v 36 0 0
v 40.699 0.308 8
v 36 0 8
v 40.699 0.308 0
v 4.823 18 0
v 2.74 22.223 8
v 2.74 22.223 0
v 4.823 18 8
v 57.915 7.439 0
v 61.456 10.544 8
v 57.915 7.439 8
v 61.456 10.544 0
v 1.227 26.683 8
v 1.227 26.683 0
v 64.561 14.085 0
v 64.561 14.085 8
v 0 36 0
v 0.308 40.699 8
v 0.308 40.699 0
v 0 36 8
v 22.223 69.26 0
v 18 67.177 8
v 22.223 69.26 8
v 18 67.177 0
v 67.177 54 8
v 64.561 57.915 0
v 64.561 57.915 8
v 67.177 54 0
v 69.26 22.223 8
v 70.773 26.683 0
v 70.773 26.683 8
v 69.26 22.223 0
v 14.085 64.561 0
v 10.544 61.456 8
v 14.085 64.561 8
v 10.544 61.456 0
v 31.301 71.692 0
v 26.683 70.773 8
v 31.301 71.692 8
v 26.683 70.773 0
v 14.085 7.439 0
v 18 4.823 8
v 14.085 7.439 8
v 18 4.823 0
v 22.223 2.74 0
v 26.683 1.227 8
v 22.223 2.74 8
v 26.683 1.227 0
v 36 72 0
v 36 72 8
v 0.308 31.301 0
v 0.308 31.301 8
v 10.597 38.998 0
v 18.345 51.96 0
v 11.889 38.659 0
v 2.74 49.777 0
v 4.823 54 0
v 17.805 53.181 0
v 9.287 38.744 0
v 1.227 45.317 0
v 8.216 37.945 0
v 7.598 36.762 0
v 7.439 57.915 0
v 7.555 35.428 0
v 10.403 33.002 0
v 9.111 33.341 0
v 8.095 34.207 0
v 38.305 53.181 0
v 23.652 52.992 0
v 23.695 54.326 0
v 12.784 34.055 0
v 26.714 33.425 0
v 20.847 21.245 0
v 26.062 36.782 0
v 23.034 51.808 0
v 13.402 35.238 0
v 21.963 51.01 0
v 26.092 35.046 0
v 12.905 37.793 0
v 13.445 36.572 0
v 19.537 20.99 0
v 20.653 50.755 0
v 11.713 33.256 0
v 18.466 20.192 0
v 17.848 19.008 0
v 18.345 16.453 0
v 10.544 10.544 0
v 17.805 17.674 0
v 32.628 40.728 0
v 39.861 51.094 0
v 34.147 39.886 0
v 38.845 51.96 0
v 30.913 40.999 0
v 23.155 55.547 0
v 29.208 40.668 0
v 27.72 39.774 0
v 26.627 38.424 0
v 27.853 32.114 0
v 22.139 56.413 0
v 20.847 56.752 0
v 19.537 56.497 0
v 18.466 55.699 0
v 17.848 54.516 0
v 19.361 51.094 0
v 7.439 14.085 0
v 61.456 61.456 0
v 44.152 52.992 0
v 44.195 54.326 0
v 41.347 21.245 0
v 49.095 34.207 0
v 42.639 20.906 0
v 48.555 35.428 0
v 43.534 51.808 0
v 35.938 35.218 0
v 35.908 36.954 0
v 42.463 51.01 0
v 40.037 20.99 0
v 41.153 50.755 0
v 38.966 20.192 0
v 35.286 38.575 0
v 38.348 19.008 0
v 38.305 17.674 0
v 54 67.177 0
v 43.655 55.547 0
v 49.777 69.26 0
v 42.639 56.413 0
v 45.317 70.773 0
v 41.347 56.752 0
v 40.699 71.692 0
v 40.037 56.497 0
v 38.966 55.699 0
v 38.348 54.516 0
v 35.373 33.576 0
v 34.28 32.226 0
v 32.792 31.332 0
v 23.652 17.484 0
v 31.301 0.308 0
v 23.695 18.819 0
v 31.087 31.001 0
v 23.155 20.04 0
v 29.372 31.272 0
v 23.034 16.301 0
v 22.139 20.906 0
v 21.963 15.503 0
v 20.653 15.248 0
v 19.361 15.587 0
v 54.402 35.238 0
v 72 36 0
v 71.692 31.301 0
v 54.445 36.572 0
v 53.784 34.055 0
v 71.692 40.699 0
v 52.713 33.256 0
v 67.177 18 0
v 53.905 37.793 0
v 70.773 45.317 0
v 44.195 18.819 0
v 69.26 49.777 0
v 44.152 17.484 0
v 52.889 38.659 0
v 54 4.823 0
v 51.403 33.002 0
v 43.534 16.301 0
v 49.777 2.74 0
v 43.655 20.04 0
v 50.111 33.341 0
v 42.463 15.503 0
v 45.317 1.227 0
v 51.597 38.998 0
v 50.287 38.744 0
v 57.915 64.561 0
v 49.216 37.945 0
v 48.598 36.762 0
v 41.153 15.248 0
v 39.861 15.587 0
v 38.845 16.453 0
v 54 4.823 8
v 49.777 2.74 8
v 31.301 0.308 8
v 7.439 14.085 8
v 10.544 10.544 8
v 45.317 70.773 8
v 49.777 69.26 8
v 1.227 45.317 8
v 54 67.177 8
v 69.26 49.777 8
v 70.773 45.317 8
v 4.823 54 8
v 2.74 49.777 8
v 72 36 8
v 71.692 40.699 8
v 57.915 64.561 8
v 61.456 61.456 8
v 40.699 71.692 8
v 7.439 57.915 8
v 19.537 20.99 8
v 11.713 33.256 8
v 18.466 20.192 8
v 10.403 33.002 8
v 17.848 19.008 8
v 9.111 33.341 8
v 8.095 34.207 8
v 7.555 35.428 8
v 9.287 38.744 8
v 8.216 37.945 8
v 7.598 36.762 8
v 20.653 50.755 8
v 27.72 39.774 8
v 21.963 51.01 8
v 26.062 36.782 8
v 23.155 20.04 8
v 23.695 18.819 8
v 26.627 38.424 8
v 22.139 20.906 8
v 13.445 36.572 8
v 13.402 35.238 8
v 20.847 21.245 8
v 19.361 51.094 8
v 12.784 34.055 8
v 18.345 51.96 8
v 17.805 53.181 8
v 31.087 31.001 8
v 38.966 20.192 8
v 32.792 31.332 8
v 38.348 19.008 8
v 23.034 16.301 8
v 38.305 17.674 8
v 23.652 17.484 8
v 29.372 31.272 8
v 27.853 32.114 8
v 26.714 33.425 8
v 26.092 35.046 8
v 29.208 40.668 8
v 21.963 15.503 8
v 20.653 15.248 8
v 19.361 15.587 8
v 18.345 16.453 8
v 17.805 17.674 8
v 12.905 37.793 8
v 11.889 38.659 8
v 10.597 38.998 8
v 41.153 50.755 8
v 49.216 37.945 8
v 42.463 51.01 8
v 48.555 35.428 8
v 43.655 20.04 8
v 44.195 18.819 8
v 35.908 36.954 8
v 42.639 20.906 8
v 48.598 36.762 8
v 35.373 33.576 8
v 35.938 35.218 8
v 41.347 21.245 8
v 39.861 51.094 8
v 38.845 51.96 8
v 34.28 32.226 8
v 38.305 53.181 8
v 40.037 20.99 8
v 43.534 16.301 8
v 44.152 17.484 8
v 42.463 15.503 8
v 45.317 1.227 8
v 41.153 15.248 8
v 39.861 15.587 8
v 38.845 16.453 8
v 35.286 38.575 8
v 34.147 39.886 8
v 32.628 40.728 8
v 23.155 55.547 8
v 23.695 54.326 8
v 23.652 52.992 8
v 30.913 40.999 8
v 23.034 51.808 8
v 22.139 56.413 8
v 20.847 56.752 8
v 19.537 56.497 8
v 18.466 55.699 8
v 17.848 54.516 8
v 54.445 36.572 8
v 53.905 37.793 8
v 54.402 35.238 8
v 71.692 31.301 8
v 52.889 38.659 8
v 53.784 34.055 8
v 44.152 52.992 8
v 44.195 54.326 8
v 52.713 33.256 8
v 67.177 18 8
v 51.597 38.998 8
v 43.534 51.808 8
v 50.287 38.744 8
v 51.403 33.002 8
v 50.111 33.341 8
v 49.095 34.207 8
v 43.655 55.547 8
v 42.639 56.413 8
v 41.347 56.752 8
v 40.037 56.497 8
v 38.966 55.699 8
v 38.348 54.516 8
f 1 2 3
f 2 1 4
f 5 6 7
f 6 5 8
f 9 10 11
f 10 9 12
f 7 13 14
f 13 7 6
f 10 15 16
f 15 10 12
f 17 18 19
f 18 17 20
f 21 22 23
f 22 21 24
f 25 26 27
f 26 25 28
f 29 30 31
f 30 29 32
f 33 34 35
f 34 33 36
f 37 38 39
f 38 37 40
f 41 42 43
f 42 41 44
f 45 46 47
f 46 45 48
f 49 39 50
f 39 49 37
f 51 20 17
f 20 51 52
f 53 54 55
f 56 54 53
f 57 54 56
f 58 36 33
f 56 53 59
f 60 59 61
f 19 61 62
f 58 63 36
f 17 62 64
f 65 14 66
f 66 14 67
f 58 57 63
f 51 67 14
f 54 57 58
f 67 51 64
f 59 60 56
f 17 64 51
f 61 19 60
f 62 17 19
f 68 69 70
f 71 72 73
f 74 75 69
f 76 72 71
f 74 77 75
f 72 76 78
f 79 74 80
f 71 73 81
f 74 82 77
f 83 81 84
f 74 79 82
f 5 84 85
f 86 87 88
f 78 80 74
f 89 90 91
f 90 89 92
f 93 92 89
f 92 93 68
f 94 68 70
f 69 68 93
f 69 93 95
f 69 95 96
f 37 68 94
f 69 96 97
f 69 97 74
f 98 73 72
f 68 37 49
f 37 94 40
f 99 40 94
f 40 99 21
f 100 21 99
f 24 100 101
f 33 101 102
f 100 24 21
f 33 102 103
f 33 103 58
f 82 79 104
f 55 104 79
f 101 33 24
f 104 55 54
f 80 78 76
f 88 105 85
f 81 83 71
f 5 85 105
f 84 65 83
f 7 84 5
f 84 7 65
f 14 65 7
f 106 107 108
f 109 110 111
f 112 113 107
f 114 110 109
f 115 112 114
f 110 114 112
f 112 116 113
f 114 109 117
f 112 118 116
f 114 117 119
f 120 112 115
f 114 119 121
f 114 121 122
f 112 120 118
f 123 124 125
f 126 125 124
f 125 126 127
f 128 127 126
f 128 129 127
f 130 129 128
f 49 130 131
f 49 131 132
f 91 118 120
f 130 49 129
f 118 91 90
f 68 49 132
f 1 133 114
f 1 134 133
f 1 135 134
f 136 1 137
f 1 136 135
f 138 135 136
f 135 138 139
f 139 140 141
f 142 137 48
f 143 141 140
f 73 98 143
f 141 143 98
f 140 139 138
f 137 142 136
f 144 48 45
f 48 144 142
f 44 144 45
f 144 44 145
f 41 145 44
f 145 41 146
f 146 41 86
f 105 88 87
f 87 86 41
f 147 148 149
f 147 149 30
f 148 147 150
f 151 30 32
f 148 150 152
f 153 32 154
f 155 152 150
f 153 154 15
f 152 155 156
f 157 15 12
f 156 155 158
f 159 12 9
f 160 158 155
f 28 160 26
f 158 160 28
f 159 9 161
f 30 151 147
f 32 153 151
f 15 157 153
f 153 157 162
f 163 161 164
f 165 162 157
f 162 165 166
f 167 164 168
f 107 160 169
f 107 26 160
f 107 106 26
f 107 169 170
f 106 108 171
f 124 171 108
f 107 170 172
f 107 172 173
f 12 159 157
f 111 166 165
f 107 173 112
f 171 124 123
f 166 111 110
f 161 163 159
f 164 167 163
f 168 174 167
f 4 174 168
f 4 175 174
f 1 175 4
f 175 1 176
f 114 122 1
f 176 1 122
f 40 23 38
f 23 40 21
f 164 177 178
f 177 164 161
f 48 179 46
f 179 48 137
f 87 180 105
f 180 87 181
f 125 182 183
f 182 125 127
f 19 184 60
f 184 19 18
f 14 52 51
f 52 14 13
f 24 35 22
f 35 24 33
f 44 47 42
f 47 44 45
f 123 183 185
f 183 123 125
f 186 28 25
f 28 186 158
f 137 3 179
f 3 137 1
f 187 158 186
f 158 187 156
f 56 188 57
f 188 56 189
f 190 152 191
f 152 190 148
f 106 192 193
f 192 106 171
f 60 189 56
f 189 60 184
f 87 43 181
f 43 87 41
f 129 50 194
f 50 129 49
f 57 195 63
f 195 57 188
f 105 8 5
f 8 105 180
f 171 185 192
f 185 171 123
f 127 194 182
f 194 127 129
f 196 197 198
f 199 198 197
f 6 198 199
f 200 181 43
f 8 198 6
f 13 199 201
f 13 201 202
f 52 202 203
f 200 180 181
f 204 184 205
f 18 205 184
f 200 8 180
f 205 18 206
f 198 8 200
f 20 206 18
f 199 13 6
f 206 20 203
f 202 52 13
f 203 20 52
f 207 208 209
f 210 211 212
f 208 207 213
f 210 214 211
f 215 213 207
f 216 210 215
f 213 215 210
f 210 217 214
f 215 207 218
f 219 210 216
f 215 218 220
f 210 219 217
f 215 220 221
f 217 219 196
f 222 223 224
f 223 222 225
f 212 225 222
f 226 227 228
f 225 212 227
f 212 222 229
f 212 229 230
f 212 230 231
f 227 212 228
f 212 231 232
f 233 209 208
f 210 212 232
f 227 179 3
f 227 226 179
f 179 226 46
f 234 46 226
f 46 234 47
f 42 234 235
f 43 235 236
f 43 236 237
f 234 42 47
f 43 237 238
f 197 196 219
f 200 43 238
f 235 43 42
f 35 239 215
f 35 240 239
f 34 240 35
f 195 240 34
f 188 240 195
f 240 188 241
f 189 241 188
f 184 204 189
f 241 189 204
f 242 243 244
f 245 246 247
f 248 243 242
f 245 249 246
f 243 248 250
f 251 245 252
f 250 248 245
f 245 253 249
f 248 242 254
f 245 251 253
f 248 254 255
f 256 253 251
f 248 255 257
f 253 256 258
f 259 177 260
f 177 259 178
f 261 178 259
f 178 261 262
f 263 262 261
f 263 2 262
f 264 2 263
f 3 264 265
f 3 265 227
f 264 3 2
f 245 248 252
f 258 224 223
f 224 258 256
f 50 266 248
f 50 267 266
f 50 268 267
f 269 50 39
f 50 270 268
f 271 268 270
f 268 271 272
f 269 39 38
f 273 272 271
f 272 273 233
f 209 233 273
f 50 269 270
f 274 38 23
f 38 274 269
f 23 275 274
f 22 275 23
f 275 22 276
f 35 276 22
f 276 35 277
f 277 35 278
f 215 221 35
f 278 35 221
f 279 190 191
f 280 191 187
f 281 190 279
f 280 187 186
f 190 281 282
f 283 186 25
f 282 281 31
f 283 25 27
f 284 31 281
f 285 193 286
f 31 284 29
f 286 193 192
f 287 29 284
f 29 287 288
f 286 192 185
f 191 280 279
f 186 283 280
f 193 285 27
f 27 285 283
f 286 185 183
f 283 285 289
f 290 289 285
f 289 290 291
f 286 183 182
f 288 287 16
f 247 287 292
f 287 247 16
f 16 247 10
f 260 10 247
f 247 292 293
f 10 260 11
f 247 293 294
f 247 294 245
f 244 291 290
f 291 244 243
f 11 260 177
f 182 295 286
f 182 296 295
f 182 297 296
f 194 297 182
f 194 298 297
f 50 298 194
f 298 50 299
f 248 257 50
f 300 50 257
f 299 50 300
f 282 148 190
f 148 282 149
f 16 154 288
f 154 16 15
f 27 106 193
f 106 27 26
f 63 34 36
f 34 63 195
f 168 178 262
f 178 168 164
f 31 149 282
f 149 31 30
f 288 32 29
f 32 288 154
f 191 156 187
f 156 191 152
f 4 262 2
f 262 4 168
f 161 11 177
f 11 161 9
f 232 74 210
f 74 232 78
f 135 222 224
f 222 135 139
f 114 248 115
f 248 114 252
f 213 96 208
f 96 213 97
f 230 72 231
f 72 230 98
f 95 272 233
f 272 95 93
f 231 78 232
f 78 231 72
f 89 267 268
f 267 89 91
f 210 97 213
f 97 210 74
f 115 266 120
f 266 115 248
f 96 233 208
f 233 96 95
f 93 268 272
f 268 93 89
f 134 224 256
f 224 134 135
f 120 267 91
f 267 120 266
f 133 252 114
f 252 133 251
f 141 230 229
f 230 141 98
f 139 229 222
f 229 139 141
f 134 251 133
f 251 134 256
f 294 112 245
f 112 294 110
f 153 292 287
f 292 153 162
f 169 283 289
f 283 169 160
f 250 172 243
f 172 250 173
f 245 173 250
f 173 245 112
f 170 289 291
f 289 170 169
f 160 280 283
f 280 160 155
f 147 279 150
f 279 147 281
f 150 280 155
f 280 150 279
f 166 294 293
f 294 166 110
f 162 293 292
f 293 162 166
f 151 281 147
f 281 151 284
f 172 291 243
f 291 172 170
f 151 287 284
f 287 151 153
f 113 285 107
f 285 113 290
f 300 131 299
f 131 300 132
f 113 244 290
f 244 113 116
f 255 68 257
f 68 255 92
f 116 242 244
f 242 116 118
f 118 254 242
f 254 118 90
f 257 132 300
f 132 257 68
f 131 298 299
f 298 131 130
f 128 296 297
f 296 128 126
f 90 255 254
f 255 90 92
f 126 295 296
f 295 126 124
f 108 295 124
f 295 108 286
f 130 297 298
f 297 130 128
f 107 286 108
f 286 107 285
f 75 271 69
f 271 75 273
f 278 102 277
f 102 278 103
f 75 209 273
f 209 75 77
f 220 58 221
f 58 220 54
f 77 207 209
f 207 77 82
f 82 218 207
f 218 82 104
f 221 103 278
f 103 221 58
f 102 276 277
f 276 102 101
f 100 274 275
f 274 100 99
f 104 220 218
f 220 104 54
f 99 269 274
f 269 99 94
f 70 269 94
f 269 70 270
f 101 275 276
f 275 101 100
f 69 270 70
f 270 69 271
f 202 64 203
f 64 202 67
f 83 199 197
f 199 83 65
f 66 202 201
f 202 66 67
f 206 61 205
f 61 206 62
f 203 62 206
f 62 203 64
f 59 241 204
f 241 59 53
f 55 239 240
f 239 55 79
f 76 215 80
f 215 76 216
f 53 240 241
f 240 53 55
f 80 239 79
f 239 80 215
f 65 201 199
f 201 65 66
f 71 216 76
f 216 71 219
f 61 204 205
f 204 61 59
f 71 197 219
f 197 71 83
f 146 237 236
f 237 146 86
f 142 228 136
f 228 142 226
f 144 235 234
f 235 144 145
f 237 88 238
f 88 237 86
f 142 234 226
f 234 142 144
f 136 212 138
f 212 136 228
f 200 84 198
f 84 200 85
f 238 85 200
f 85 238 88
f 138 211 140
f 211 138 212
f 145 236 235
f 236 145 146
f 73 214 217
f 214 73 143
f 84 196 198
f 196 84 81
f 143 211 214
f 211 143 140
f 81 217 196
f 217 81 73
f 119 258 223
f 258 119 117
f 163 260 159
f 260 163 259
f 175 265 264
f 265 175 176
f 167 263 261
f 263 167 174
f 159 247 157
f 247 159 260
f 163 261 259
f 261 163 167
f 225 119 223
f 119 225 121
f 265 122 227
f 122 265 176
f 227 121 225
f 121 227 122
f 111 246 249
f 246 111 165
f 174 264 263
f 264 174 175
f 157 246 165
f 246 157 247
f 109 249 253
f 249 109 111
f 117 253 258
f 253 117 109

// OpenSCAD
$fn = 32;

// ----------------------------------------------------------------------
// Cam plate: eccentric cam, base R36
// ----------------------------------------------------------------------

// --- parameters (mm) ---
base_r = 36;              // base circle radius
lobe_h = 8;               // cam lobe rise
bore_r = 5;               // shaft bore radius
plate_t = 8;              // plate thickness, Z (extrusion height)
ecc = 5;                  // disc eccentricity
ring_r = 20.5;            // lightening ring radius
bolt_r = 3;               // lightening hole radius

profile = [[72, 36], [71.692, 40.699], [70.773, 45.317], [69.26, 49.777], [67.177, 54], [64.561, 57.915], [61.456, 61.456], [57.915, 64.561], [54, 67.177], [49.777, 69.26], [45.317, 70.773], [40.699, 71.692], [36, 72], [31.301, 71.692], [26.683, 70.773], [22.223, 69.26], [18, 67.177], [14.085, 64.561], [10.544, 61.456], [7.439, 57.915], [4.823, 54], [2.74, 49.777], [1.227, 45.317], [0.308, 40.699], [0, 36], [0.308, 31.301], [1.227, 26.683], [2.74, 22.223], [4.823, 18], [7.439, 14.085], [10.544, 10.544], [14.085, 7.439], [18, 4.823], [22.223, 2.74], [26.683, 1.227], [31.301, 0.308], [36, 0], [40.699, 0.308], [45.317, 1.227], [49.777, 2.74], [54, 4.823], [57.915, 7.439], [61.456, 10.544], [64.561, 14.085], [67.177, 18], [69.26, 22.223], [70.773, 26.683], [71.692, 31.301]];  // primary outline, 48 points, counter clockwise
void_1 = [[35.908, 36.954], [35.286, 38.575], [34.147, 39.886], [32.628, 40.728], [30.913, 40.999], [29.208, 40.668], [27.72, 39.774], [26.627, 38.424], [26.062, 36.782], [26.092, 35.046], [26.714, 33.425], [27.853, 32.114], [29.372, 31.272], [31.087, 31.001], [32.792, 31.332], [34.28, 32.226], [35.373, 33.576], [35.938, 35.218]];  // shaft bore, 18 points
void_2 = [[54.445, 36.572], [53.905, 37.793], [52.889, 38.659], [51.597, 38.998], [50.287, 38.744], [49.216, 37.945], [48.598, 36.762], [48.555, 35.428], [49.095, 34.207], [50.111, 33.341], [51.403, 33.002], [52.713, 33.256], [53.784, 34.055], [54.402, 35.238]];  // lightening hole 1, 14 points
void_3 = [[44.195, 54.326], [43.655, 55.547], [42.639, 56.413], [41.347, 56.752], [40.037, 56.497], [38.966, 55.699], [38.348, 54.516], [38.305, 53.181], [38.845, 51.96], [39.861, 51.094], [41.153, 50.755], [42.463, 51.01], [43.534, 51.808], [44.152, 52.992]];  // lightening hole 2, 14 points
void_4 = [[23.695, 54.326], [23.155, 55.547], [22.139, 56.413], [20.847, 56.752], [19.537, 56.497], [18.466, 55.699], [17.848, 54.516], [17.805, 53.181], [18.345, 51.96], [19.361, 51.094], [20.653, 50.755], [21.963, 51.01], [23.034, 51.808], [23.652, 52.992]];  // lightening hole 3, 14 points
void_5 = [[13.445, 36.572], [12.905, 37.793], [11.889, 38.659], [10.597, 38.998], [9.287, 38.744], [8.216, 37.945], [7.598, 36.762], [7.555, 35.428], [8.095, 34.207], [9.111, 33.341], [10.403, 33.002], [11.713, 33.256], [12.784, 34.055], [13.402, 35.238]];  // lightening hole 4, 14 points
void_6 = [[23.695, 18.819], [23.155, 20.04], [22.139, 20.906], [20.847, 21.245], [19.537, 20.99], [18.466, 20.192], [17.848, 19.008], [17.805, 17.674], [18.345, 16.453], [19.361, 15.587], [20.653, 15.248], [21.963, 15.503], [23.034, 16.301], [23.652, 17.484]];  // lightening hole 5, 14 points
void_7 = [[44.195, 18.819], [43.655, 20.04], [42.639, 20.906], [41.347, 21.245], [40.037, 20.99], [38.966, 20.192], [38.348, 19.008], [38.305, 17.674], [38.845, 16.453], [39.861, 15.587], [41.153, 15.248], [42.463, 15.503], [43.534, 16.301], [44.152, 17.484]];  // lightening hole 6, 14 points

// --- the one profile operation ---
difference() {
  linear_extrude(height = plate_t) polygon(points = profile);
  translate([0, 0, -1])
    linear_extrude(height = plate_t + 2) polygon(points = void_1);
  translate([0, 0, -1])
    linear_extrude(height = plate_t + 2) polygon(points = void_2);
  translate([0, 0, -1])
    linear_extrude(height = plate_t + 2) polygon(points = void_3);
  translate([0, 0, -1])
    linear_extrude(height = plate_t + 2) polygon(points = void_4);
  translate([0, 0, -1])
    linear_extrude(height = plate_t + 2) polygon(points = void_5);
  translate([0, 0, -1])
    linear_extrude(height = plate_t + 2) polygon(points = void_6);
  translate([0, 0, -1])
    linear_extrude(height = plate_t + 2) polygon(points = void_7);
}
